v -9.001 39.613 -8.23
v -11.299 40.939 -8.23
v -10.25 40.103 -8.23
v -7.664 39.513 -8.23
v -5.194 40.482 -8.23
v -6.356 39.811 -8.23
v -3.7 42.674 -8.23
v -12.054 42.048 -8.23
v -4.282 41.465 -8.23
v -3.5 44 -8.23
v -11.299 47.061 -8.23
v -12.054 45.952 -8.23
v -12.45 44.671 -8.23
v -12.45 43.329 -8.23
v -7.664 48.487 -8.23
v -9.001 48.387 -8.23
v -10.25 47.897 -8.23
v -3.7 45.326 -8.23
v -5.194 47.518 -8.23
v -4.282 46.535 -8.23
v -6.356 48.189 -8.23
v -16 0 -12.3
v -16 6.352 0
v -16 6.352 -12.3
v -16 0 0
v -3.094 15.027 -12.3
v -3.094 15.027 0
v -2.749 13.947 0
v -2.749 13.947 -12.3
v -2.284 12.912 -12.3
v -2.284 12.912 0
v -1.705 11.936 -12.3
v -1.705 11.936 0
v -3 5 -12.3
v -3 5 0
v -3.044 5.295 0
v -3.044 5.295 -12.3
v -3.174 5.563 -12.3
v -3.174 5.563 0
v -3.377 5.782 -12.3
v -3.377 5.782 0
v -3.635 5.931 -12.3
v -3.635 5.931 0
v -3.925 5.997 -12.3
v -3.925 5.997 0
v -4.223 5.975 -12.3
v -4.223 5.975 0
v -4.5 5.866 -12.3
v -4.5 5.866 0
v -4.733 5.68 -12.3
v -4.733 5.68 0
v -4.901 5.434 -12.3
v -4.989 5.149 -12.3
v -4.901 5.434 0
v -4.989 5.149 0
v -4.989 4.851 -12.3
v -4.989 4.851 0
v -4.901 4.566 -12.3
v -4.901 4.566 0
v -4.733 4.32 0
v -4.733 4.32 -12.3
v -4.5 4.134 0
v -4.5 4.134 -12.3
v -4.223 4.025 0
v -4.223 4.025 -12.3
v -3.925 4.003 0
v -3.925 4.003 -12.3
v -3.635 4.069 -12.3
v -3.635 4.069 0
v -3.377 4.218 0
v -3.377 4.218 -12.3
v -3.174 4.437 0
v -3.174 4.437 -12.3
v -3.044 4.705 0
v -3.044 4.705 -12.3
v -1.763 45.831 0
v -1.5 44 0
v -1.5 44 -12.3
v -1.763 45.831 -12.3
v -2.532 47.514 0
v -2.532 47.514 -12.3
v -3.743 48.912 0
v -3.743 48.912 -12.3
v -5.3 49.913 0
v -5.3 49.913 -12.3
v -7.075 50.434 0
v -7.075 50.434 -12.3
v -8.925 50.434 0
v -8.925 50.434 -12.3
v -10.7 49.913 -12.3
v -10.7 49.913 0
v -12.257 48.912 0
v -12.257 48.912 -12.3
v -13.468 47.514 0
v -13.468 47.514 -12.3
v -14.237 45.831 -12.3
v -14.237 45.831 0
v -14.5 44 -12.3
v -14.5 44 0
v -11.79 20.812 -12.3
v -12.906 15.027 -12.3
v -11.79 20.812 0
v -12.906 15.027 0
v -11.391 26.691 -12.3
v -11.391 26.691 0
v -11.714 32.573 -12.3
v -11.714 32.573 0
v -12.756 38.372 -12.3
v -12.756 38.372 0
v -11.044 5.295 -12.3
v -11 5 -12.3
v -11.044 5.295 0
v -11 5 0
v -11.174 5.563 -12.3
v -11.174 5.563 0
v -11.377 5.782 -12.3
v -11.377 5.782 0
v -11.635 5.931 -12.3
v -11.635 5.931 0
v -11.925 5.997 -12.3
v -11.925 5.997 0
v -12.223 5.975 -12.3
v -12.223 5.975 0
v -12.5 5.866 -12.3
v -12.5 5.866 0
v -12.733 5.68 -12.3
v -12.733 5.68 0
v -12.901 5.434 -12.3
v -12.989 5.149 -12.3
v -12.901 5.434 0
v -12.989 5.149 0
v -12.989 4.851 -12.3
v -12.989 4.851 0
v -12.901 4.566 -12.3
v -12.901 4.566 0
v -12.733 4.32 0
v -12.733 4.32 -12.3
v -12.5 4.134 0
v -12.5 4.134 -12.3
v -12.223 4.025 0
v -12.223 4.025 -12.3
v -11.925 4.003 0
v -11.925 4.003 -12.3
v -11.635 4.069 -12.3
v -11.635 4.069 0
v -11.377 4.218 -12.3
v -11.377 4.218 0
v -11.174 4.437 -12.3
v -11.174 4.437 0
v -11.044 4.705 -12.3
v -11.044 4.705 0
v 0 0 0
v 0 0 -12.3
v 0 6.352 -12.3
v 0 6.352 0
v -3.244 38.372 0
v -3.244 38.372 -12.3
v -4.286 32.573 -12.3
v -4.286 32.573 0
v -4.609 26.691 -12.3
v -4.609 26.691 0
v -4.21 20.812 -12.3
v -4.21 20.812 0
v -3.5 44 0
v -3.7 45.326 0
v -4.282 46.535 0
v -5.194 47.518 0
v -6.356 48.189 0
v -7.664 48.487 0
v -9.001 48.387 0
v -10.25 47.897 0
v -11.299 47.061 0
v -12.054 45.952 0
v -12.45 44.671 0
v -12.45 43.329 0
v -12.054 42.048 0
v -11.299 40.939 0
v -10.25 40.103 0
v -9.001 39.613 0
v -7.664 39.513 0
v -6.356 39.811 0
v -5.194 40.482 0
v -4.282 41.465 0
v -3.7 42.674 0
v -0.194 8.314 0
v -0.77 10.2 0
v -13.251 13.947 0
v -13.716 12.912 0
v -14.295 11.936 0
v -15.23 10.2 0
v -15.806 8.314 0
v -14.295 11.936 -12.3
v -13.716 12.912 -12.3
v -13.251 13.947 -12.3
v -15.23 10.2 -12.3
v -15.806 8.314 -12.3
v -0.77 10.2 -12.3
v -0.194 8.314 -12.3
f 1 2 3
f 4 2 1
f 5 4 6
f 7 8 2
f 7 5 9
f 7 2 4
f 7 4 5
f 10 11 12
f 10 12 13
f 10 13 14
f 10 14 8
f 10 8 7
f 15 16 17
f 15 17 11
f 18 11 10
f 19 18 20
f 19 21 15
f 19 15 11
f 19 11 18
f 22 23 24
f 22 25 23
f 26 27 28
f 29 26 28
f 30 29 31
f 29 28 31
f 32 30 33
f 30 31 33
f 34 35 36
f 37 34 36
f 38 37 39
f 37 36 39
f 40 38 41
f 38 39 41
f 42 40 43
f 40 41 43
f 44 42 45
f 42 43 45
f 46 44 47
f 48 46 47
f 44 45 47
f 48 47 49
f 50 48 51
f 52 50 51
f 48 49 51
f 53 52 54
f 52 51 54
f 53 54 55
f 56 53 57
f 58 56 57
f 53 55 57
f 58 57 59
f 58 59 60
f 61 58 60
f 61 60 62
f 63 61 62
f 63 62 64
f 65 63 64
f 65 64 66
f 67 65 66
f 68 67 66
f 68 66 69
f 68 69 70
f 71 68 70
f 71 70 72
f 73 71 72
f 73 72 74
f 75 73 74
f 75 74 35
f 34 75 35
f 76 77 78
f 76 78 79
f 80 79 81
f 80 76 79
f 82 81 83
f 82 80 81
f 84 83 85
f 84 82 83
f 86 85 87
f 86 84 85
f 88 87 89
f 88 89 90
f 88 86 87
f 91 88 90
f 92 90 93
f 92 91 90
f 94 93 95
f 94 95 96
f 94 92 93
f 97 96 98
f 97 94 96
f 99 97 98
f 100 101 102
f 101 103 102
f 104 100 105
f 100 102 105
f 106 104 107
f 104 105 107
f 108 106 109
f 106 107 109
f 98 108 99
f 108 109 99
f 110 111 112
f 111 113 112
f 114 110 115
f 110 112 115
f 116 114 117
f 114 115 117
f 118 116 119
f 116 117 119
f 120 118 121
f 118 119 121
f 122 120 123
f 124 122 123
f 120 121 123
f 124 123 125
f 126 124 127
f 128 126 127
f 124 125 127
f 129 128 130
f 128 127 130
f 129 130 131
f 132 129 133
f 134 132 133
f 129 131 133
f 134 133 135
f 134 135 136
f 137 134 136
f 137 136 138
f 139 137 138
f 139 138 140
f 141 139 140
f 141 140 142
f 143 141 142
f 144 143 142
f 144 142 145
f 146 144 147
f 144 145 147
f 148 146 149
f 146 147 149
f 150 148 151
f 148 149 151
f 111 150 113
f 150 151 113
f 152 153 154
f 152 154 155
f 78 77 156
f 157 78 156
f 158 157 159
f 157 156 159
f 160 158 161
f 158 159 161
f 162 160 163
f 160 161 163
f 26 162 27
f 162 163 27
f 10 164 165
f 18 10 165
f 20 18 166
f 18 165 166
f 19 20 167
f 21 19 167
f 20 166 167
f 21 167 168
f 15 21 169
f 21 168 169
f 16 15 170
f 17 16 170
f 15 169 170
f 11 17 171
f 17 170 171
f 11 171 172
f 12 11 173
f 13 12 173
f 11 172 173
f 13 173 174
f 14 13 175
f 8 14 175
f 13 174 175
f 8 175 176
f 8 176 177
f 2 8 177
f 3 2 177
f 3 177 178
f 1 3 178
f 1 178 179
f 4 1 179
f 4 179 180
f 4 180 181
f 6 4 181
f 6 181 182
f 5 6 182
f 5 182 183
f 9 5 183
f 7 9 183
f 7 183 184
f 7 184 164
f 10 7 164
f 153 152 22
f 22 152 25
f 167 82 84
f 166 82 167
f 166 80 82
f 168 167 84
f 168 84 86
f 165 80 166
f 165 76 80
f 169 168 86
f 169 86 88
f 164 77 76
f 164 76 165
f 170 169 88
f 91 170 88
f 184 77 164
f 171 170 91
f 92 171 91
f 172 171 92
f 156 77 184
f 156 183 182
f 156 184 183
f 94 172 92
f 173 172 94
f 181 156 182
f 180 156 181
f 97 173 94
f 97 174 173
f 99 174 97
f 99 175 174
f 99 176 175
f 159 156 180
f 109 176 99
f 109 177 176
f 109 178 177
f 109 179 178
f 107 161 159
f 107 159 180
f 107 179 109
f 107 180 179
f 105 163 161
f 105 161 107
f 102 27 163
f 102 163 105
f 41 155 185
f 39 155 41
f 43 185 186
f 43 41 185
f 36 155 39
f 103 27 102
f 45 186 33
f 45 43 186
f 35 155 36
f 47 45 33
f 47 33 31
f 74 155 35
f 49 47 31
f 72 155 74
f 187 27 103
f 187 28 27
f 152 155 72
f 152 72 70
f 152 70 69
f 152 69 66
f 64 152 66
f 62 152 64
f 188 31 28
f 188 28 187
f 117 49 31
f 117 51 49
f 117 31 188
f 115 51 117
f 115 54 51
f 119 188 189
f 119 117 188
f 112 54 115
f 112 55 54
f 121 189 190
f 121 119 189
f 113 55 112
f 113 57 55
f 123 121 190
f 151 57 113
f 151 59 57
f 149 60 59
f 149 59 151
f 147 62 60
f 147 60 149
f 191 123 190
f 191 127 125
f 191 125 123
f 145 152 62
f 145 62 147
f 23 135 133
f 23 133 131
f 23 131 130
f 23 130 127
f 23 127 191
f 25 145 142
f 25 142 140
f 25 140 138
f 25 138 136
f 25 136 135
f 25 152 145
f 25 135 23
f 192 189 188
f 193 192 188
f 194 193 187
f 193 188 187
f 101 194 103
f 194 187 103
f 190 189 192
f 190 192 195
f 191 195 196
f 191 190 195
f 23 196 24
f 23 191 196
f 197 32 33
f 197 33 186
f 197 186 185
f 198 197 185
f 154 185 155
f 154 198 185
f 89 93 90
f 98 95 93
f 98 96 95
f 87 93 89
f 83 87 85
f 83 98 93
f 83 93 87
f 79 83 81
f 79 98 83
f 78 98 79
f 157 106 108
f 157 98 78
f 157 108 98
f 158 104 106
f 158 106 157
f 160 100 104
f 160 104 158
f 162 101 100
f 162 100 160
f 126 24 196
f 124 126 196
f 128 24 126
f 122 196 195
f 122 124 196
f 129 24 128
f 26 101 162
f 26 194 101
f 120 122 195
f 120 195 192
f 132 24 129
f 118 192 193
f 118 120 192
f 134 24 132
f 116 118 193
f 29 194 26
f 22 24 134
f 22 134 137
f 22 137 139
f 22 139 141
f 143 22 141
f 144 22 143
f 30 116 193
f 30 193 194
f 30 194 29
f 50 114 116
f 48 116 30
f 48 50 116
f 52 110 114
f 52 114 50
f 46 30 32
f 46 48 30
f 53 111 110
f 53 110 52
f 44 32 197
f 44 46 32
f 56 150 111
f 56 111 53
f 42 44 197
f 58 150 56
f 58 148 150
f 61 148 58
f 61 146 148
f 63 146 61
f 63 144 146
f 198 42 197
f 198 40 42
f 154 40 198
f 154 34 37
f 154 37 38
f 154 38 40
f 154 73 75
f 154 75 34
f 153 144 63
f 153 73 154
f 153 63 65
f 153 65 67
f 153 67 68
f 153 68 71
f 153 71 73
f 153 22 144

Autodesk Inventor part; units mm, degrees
ref_plane "YZ Plane" through (0, 0, 0) normal (1, 0, 0) x (0, 1, 0)
ref_plane "XZ Plane" through (0, 0, 0) normal (0, 1, 0) x (-1, 0, 0)
ref_plane "XY Plane" through (0, 0, 0) normal (0, 0, 1) x (1, 0, 0)
sketch "Sketch1" plane through (0, 0, 0) normal (0, 1, 0) x (-1, 0, 0)
  line L0 (0, 0) -> (16, 0)
  line L1 (16, 0) -> (16, -12.3)
  line L2 (16, -12.3) -> (0, -12.3)
  line L3 (0, -12.3) -> (0, 0)
  dimension "d0" = 16
  dimension "d1" = 12.3
extrude "Extrusion1" add sketch "Sketch1" along normal blind 10
sketch "Sketch2" plane through (0, 10, 0) normal (0, 1, 0) x (1, 0, 0)
  line L0 (-16, 0) -> (0, 0) projected
  line L1 (-8, 0) -> (-8, 12.3)
  line L2 (0, 12.3) -> (-16, 12.3) projected
  line L3 (-14.5, 0) -> (-14.5, 12.3)
  line L4 (-1.5, 0) -> (-1.5, 12.3)
  dimension "d4" = 6.5
  dimension "d5" = 6.5
extrude "Extrusion2" add sketch "Sketch2" along normal blind 40.5
sketch "Sketch3" plane through (-16, 0, 0) normal (0, 0, 1) x (1, 0, 0)
  line L0 (14.5, 50.5) -> (1.5, 50.5) projected
  line L1 (8, 50.5) -> (8, 0)
  line L2 (0, 0) -> (16, 0) projected
  circle A0 centre (8, 44) radius 4.5
  line L3 (1.5, 50.5) -> (14.5, 50.5) projected
  circle A1 centre (8, 44) radius 6.5
  line L4 (14.5, 10) -> (14.5, 50.5) projected
  line L5 (14.5, 30.25) -> (1.5, 30.25)
  line L6 (1.5, 10) -> (1.5, 50.5) projected
  line L7 (8, 30.25) -> (11.5, 30.25)
  arc A2 (14.5, 44) -> (14.5, 10) centre (59.4062, 27) ccw
  line L8 (8, 30.25) -> (4.5, 30.25)
  arc A3 (1.5, 10) -> (1.5, 44) centre (-43.4062, 27) ccw
  dimension "d8" = 6.5
  dimension "d9" = 9
  dimension "d10" = 13
  dimension "d11" = 3.5
  dimension "d12" = 3.5
extrude "Extrusion3" cut sketch "Sketch3" against normal blind 13.5 contours L4 A1 L0 | A1 L6 L0 | L4 L5 A2 A1 | A1 A2 | A3 A1 | A1 A3 L5 L6 | L4 A2 L5 | L5 A3 L6
fillet "Fillet1" radius 10 4 edges at (0, 10, -6.15) (-1.5, 10, -6.15) (-14.5, 10, -6.15) (-16, 10, -6.15)
sketch "Sketch4" plane through (-16, 0, 0) normal (0, 0, 1) x (1, 0, 0)
  arc A0 (14.5, 44) -> (1.5, 44) centre (8, 44) ccw projected
  circle A1 centre (8, 44) radius 4.5
  point P0 (16, 0)
  dimension "d16" = 9
extrude "Extrusion4" cut sketch "Sketch4" against normal blind 8.23
sketch "Sketch5" plane through (0, 0, 0) normal (0, -1, 0) x (1, 0, 0)
  point P0 (0, 0)
sketch "Sketch7" plane through (-16, 0, 0) normal (0, 0, 1) x (1, 0, 0)
  line L0 (16, 0) -> (0, 0) projected
  line L1 (0, 0) -> (16, 0)
  line L2 (16, 0) -> (16, 10)
  line L3 (16, 10) -> (0, 10)
  line L4 (0, 10) -> (0, 0)
  line L5 (0, 5) -> (16, 5)
  line L6 (8, 10) -> (8, 0)
  circle A0 centre (4, 5) radius 1
  circle A1 centre (12, 5) radius 1
extrude "Extrusion6" cut sketch "Sketch7" against normal blind 12.3 contours A1 L5 | L5 A1 | A0 L5 | L5 A0
properties part number "pawn"
